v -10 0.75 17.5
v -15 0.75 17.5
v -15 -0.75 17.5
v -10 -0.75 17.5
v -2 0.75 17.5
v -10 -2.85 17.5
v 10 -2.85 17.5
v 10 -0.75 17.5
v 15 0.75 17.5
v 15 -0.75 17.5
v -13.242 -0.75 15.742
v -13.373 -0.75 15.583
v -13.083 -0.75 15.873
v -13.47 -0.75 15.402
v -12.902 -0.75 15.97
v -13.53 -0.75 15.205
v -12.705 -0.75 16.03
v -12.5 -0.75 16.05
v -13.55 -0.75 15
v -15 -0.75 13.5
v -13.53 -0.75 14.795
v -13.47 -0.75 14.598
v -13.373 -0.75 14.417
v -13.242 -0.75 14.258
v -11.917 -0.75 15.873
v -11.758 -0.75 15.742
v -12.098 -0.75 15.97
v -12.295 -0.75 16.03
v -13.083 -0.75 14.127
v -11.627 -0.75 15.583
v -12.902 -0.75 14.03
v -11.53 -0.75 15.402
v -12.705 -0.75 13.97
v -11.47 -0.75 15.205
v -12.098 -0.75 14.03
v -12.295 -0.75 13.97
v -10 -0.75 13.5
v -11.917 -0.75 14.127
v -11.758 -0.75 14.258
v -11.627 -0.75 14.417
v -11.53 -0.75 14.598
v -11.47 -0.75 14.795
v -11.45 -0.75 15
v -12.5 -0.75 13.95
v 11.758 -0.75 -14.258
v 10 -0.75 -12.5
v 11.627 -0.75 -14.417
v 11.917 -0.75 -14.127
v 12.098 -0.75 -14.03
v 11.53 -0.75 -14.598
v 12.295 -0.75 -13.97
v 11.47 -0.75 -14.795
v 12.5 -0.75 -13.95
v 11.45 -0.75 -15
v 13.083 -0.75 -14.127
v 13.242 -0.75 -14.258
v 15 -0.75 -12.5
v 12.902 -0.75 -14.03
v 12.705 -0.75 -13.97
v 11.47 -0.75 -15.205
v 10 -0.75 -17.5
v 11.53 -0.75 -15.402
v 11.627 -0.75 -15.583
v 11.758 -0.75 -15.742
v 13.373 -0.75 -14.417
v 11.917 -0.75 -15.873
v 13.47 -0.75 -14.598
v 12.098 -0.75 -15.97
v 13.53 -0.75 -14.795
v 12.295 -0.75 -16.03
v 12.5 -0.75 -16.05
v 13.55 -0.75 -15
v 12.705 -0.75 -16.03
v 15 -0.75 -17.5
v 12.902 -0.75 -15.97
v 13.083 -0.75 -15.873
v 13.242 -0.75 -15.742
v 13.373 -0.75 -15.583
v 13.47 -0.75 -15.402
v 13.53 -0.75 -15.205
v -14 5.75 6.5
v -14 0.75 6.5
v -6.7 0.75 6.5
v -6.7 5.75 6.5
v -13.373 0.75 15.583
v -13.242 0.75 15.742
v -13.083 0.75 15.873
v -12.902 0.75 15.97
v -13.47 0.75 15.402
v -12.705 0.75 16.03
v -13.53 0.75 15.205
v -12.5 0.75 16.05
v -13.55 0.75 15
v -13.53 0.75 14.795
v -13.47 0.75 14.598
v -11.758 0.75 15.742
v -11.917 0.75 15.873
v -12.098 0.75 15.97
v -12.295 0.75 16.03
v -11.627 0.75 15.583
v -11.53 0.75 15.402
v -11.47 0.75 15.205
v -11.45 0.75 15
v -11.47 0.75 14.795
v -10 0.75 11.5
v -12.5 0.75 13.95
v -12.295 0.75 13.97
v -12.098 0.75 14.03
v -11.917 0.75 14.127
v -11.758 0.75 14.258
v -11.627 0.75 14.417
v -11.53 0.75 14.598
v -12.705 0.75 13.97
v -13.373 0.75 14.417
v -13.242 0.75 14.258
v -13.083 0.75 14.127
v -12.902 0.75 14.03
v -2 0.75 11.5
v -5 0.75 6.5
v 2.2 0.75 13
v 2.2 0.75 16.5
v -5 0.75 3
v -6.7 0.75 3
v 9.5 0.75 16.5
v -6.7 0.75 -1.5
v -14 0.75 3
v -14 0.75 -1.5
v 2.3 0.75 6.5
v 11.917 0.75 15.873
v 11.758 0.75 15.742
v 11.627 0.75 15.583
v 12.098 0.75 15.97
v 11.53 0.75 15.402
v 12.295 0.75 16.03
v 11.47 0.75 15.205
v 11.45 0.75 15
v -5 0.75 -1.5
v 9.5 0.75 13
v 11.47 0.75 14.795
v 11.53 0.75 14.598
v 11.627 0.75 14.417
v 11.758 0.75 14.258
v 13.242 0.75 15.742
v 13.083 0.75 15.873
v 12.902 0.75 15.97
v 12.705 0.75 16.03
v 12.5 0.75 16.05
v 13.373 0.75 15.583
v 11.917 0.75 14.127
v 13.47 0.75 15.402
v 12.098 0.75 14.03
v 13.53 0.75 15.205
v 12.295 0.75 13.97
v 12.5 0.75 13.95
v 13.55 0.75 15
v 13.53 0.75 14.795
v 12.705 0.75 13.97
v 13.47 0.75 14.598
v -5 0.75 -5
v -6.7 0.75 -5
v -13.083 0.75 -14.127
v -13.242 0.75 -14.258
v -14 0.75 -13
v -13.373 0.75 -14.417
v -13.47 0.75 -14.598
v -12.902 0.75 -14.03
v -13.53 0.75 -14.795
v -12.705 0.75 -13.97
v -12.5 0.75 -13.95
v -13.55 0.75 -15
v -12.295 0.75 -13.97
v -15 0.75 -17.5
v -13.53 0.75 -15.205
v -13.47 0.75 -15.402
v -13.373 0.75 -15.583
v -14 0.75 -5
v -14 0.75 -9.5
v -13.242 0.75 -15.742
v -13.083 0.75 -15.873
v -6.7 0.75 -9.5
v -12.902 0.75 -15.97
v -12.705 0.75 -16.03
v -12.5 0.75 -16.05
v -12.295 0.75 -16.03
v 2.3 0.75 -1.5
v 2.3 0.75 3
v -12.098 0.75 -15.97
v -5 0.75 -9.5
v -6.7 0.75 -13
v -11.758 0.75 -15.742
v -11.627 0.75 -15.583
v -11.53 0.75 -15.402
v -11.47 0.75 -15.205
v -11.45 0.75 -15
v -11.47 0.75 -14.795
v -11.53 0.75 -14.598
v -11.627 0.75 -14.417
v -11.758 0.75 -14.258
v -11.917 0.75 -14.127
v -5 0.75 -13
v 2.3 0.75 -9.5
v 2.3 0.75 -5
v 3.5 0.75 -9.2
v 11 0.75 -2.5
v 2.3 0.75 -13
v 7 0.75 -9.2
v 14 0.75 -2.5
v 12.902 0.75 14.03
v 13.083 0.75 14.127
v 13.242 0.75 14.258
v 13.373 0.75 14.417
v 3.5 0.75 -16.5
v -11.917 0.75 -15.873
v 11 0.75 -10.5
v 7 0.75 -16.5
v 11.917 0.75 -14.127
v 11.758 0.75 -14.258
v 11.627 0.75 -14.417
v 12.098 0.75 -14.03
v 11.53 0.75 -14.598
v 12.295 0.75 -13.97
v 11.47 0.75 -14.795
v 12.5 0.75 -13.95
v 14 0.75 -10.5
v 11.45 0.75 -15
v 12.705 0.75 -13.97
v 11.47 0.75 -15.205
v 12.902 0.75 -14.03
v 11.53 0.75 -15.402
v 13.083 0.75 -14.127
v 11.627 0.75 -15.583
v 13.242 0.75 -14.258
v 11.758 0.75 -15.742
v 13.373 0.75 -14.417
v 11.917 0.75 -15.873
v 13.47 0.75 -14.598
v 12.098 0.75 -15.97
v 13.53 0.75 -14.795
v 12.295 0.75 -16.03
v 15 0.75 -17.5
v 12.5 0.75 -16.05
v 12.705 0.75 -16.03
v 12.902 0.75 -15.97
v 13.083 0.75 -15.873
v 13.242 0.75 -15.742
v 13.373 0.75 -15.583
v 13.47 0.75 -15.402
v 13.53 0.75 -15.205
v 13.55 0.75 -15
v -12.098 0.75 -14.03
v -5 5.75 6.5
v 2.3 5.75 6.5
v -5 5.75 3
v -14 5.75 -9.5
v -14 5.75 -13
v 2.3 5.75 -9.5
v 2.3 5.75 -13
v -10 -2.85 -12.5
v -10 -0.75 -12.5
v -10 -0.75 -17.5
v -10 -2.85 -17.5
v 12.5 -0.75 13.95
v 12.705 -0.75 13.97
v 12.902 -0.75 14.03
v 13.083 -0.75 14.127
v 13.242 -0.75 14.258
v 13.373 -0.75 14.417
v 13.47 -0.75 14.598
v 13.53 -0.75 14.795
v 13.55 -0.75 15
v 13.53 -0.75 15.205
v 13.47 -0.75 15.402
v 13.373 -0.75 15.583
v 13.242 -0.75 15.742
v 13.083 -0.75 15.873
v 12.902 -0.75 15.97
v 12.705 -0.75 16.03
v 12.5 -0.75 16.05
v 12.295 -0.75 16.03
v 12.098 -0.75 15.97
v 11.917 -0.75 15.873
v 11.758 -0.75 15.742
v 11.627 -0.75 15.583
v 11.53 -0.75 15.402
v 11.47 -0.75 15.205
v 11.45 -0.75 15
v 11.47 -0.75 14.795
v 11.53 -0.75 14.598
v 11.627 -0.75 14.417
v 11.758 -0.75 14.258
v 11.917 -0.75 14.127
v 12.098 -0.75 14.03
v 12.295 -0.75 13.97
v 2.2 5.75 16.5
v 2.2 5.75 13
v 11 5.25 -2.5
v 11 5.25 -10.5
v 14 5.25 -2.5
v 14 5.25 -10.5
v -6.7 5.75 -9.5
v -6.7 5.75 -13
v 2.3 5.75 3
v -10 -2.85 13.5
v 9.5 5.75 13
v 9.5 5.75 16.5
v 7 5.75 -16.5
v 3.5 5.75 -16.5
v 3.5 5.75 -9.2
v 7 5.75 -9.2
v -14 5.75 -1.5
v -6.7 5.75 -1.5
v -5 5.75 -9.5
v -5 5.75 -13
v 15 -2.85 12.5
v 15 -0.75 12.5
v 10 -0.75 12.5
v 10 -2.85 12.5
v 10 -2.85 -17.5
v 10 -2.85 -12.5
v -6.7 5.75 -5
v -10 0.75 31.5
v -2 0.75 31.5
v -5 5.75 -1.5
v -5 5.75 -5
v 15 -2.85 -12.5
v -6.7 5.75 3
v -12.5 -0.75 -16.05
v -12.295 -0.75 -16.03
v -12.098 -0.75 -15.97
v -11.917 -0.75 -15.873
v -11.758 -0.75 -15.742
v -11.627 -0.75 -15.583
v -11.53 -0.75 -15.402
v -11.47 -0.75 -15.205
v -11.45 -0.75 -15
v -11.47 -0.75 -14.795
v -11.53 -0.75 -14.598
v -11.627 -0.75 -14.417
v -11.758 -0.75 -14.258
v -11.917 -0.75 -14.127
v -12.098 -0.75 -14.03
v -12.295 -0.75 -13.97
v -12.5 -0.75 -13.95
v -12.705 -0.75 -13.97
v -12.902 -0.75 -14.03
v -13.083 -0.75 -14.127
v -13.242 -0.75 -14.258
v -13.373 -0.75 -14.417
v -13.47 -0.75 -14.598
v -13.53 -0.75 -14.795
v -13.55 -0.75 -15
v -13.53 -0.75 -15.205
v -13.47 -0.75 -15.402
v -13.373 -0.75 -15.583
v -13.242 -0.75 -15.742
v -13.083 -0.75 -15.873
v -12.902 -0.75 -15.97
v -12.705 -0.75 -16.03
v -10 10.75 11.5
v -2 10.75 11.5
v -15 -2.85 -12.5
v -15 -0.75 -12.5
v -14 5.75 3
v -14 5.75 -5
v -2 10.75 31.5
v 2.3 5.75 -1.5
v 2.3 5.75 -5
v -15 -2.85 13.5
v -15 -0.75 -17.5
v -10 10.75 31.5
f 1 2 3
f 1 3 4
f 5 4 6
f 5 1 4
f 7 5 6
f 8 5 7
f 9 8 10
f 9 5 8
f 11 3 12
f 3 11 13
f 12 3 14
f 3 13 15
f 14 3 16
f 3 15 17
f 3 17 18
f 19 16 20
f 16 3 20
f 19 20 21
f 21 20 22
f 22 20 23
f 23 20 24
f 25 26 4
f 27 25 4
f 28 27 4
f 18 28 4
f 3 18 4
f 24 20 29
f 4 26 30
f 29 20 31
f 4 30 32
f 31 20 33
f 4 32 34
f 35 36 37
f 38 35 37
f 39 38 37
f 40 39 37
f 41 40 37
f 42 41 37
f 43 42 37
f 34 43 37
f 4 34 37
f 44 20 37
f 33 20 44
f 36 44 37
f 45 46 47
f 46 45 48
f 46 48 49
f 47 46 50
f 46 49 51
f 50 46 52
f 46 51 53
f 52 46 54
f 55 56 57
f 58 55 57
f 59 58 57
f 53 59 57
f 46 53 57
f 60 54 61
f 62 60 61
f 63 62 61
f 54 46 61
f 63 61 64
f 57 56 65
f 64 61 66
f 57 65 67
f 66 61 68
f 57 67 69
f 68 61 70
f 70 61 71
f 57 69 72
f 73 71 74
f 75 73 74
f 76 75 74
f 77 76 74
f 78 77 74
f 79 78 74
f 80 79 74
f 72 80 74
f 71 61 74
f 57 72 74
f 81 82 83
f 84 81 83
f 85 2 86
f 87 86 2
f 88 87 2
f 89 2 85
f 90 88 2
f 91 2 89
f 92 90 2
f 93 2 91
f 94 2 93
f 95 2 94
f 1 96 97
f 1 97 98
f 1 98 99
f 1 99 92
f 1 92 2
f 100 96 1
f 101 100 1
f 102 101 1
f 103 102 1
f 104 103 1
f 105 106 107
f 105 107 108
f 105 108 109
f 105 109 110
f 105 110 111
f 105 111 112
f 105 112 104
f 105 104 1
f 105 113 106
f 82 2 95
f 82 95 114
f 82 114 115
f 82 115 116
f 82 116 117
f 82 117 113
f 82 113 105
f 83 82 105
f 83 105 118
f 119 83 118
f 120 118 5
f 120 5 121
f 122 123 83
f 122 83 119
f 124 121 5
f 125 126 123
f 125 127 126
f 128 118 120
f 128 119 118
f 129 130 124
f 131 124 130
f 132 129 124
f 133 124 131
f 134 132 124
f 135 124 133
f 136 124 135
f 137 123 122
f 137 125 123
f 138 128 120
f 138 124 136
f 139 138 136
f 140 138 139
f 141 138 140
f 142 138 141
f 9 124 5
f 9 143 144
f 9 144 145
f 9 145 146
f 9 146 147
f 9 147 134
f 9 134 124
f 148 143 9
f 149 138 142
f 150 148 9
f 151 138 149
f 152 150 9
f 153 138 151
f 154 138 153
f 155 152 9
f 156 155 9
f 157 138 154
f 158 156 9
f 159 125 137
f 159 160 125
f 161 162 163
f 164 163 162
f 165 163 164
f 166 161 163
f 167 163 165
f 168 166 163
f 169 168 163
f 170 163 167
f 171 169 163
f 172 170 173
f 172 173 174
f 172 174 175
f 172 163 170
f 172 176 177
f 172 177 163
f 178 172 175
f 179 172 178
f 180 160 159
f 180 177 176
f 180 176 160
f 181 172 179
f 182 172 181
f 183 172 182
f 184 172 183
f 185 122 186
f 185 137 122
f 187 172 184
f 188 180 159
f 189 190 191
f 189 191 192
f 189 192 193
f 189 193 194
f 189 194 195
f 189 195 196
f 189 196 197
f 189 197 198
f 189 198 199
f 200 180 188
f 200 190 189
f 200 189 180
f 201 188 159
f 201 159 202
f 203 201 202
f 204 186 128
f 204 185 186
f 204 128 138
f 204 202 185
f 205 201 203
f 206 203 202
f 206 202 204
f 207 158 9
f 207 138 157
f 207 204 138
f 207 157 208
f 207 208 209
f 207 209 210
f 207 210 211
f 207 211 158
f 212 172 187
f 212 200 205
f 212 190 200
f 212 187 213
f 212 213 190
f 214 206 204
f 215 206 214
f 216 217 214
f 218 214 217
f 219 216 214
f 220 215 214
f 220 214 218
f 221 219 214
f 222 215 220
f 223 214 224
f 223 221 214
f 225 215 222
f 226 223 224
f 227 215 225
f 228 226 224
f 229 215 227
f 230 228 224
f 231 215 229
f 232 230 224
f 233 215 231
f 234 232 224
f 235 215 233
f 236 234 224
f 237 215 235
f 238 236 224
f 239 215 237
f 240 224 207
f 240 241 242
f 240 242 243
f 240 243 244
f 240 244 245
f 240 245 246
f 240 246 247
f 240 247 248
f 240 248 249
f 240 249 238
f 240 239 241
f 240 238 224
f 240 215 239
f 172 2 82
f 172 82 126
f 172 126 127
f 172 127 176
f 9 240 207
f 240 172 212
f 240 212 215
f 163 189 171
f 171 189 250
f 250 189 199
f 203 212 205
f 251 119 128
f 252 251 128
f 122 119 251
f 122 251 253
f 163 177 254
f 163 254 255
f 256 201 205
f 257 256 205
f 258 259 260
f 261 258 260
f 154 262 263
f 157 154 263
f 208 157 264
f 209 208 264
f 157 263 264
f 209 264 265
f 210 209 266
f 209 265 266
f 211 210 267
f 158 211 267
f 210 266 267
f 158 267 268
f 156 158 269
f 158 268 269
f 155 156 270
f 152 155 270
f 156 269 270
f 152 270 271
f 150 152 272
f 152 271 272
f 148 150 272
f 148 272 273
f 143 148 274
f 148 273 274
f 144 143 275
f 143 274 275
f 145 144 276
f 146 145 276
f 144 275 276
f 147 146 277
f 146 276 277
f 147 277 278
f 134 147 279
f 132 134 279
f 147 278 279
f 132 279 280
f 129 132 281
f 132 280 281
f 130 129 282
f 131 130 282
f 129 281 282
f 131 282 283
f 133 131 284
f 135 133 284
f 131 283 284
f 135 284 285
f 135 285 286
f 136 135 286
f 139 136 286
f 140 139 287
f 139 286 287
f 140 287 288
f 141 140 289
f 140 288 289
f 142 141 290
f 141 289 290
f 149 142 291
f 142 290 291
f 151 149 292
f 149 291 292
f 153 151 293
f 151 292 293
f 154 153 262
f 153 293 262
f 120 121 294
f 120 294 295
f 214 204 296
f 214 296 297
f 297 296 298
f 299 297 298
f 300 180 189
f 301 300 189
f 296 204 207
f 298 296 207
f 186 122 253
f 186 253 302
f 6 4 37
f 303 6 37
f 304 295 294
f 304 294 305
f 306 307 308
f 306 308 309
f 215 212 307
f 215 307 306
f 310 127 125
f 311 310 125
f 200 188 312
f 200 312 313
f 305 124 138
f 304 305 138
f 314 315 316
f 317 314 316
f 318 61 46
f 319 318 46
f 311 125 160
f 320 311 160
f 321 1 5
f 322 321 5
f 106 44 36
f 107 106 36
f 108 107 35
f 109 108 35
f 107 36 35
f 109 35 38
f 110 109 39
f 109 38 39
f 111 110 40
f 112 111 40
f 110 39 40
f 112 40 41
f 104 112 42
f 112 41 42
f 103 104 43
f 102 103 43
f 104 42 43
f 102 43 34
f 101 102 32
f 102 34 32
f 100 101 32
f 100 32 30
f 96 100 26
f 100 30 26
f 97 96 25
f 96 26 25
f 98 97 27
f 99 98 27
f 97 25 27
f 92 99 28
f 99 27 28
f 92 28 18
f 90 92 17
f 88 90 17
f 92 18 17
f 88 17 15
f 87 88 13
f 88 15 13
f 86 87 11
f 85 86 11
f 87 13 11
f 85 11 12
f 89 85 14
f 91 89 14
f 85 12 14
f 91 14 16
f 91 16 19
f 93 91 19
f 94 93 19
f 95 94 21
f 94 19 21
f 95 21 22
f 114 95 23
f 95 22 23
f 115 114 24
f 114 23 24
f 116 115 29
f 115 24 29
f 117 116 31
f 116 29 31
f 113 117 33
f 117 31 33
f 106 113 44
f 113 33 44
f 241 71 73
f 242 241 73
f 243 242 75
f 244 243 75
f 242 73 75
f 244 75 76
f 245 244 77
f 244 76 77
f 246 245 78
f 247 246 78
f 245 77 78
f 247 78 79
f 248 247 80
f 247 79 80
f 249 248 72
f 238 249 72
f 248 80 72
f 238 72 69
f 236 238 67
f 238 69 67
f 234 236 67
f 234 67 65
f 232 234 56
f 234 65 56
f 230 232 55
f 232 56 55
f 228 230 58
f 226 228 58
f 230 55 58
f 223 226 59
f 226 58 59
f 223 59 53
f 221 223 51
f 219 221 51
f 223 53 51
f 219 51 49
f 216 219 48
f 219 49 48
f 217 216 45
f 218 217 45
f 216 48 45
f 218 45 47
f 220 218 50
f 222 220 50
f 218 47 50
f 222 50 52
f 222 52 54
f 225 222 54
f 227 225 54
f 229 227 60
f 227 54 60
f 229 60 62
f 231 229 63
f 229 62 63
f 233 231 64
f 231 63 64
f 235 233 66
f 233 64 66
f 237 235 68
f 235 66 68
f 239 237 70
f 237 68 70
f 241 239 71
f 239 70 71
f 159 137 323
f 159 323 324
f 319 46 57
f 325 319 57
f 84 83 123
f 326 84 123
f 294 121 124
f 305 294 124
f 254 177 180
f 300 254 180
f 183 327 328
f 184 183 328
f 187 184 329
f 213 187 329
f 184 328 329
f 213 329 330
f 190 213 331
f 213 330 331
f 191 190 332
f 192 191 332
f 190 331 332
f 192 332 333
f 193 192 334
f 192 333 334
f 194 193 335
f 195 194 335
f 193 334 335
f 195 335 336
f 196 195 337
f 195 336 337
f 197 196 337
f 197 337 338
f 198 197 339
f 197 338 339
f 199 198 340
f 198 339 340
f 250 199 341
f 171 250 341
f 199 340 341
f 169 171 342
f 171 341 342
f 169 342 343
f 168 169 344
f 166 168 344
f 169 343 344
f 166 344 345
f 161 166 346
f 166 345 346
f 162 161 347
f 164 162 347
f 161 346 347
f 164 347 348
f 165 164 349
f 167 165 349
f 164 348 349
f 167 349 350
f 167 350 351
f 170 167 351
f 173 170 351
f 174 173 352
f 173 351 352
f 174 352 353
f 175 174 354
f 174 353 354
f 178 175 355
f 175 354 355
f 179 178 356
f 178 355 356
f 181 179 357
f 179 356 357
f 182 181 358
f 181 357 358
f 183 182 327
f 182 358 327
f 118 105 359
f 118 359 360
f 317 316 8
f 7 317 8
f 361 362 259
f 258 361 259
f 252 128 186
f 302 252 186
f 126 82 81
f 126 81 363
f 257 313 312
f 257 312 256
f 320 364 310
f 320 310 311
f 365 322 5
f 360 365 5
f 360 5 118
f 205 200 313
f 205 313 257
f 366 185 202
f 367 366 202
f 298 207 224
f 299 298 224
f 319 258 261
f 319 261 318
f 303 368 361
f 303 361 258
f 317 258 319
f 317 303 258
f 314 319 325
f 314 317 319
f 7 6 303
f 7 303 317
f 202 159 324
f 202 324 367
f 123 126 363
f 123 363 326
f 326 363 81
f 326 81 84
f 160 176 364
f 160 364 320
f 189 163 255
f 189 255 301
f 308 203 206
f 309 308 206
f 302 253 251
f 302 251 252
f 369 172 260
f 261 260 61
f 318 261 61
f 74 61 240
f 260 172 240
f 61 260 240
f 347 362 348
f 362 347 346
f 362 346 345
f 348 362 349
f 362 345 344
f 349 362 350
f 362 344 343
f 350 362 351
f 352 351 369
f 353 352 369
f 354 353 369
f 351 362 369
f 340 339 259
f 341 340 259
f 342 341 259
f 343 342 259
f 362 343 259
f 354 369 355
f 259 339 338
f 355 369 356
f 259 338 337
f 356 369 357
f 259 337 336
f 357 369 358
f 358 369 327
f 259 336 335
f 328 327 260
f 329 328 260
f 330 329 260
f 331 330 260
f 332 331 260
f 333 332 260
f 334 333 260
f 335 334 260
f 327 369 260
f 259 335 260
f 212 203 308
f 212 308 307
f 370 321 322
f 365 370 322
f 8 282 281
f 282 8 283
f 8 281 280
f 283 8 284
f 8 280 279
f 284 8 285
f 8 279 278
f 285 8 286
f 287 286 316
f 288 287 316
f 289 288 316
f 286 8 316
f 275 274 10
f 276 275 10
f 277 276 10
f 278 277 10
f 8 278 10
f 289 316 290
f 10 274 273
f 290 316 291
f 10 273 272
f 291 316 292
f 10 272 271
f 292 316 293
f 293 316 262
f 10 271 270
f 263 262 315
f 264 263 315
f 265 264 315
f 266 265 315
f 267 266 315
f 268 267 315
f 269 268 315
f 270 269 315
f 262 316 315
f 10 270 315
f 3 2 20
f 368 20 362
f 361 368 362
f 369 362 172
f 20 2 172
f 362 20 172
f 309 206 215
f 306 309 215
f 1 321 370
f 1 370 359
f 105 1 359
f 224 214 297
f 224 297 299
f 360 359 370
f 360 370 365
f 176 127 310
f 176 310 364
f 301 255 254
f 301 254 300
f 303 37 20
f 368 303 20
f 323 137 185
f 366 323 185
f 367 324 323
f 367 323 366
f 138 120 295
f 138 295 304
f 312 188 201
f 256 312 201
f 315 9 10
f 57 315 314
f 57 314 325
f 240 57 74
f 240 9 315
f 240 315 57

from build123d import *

# Parameters (mm, degrees)
SKETCH_1_W                       = 30
SKETCH_1_H                       = 35
EXTRUDE_1_DEPTH                  = 0.75
SKETCH_2_R                       = 1.05
CUT_EXTRUDE_1_DEPTH              = 1.5
EXTRUDE_2_DEPTH                  = 2.1
SKETCH_4_W                       = 3.5
SKETCH_4_H                       = 7.3
SKETCH_4_W_2                     = 7.3
SKETCH_4_H_2                     = 3.5
EXTRUDE_3_DEPTH                  = 5
SKETCH_5_W                       = 7.3
SKETCH_5_H                       = 3.5
EXTRUDE_4_DEPTH                  = 5
PATTERN_LINEAR_1_COUNT           = 2
PATTERN_LINEAR_1_PITCH           = 9
PATTERN_LINEAR_2_COUNT           = 3
PATTERN_LINEAR_2_PITCH           = 8
PATTERN_LINEAR_2_COPY_1_SKETCH_W = 7.3
PATTERN_LINEAR_2_COPY_1_SKETCH_H = 3.5
PATTERN_LINEAR_2_COPY_1_DEPTH    = 5
PATTERN_LINEAR_2_COPY_2_SKETCH_W = 7.3
PATTERN_LINEAR_2_COPY_2_SKETCH_H = 3.5
PATTERN_LINEAR_2_COPY_2_DEPTH    = 5
SKETCH_6_W                       = 3
SKETCH_6_H                       = 8
EXTRUDE_5_DEPTH                  = 4.5
SKETCH_7_W                       = 8
SKETCH_7_H                       = 20
EXTRUDE_6_DEPTH                  = 10


with BuildPart() as part:
    # ｽｹｯﾁ1 → ﾎﾞｽ - 押し出し1 (new, symmetric)
    with BuildSketch(Plane(origin=(0, 0, 0), x_dir=(1, 0, 0), z_dir=(0, 1, 0))):
        Rectangle(SKETCH_1_W, SKETCH_1_H)
    extrude(amount=EXTRUDE_1_DEPTH, both=True)

    # ｽｹｯﾁ2 → ｶｯﾄ - 押し出し1 (cut)
    with BuildSketch(Plane.XZ.offset(0.75)):
        with Locations(Location((-12.5, 15, 0), (0, 0, 270))):
            Circle(SKETCH_2_R)
        with Locations(Location((-12.5, -15, 0), (0, 0, 270))):
            Circle(SKETCH_2_R)
        with Locations(Location((12.5, 15, 0), (0, 0, 270))):
            Circle(SKETCH_2_R)
        with Locations(Location((12.5, -15, 0), (0, 0, 270))):
            Circle(SKETCH_2_R)
    extrude(amount=-CUT_EXTRUDE_1_DEPTH, mode=Mode.SUBTRACT)

    # ｽｹｯﾁ3 → ﾎﾞｽ - 押し出し2 (add)
    with BuildSketch(Plane.XZ.offset(0.75)):
        Polygon((-10, 17.5), (-10, 13.5), (-15, 13.5), (-15, -12.5), (-10, -12.5), (-10, -17.5), (10, -17.5), (10, -12.5), (15, -12.5), (15, 12.5), (10, 12.5), (10, 17.5), align=None)
    extrude(amount=EXTRUDE_2_DEPTH)

    # ｽｹｯﾁ4 → ﾎﾞｽ - 押し出し3 (add)
    with BuildSketch(Plane(origin=(0, 0.75, 0), x_dir=(1, 0, 0), z_dir=(0, 1, 0))):
        with Locations((5.25, 12.85)):
            Rectangle(SKETCH_4_W, SKETCH_4_H)
        with Locations((5.85, -14.75)):
            Rectangle(SKETCH_4_W_2, SKETCH_4_H_2)
    extrude(amount=EXTRUDE_3_DEPTH)

    # ｽｹｯﾁ5 → ﾎﾞｽ - 押し出し4 (add)
    with BuildSketch(Plane(origin=(0, 0.75, 0), x_dir=(1, 0, 0), z_dir=(0, 1, 0))):
        with Locations((-10.35, 11.25)):
            Rectangle(SKETCH_5_W, SKETCH_5_H)
    extrude_4 = extrude(amount=EXTRUDE_4_DEPTH)

    # 直線ﾊﾟﾀｰﾝ1: ﾎﾞｽ - 押し出し4 ×2
    with Locations(*[(i * PATTERN_LINEAR_1_PITCH, 0, 0) for i in range(1, PATTERN_LINEAR_1_COUNT)]):
        add(extrude_4)

    # 直線ﾊﾟﾀｰﾝ2: ﾎﾞｽ - 押し出し4 ×3
    with Locations(*[(0, 0, i * PATTERN_LINEAR_2_PITCH) for i in range(1, PATTERN_LINEAR_2_COUNT)]):
        add(extrude_4)

    # 直線ﾊﾟﾀｰﾝ2 copy 1 sketch → 直線ﾊﾟﾀｰﾝ2 copy 1 (add)
    with BuildSketch(Plane(origin=(9, 0.75, 8), x_dir=(1, 0, 0), z_dir=(0, 1, 0))):
        with Locations((-10.35, 11.25)):
            Rectangle(PATTERN_LINEAR_2_COPY_1_SKETCH_W, PATTERN_LINEAR_2_COPY_1_SKETCH_H)
    extrude(amount=PATTERN_LINEAR_2_COPY_1_DEPTH)

    # 直線ﾊﾟﾀｰﾝ2 copy 2 sketch → 直線ﾊﾟﾀｰﾝ2 copy 2 (add)
    with BuildSketch(Plane(origin=(9, 0.75, 16), x_dir=(1, 0, 0), z_dir=(0, 1, 0))):
        with Locations((-10.35, 11.25)):
            Rectangle(PATTERN_LINEAR_2_COPY_2_SKETCH_W, PATTERN_LINEAR_2_COPY_2_SKETCH_H)
    extrude(amount=PATTERN_LINEAR_2_COPY_2_DEPTH)

    # ｽｹｯﾁ6 → ﾎﾞｽ - 押し出し5 (add)
    with BuildSketch(Plane(origin=(0, 0.75, 0), x_dir=(1, 0, 0), z_dir=(0, 1, 0))):
        with Locations((12.5, 6.5)):
            Rectangle(SKETCH_6_W, SKETCH_6_H)
    extrude(amount=EXTRUDE_5_DEPTH)

    # ｽｹｯﾁ7 → ﾎﾞｽ - 押し出し6 (add)
    with BuildSketch(Plane(origin=(0, 0.75, 0), x_dir=(1, 0, 0), z_dir=(0, 1, 0))):
        with Locations((-6, -21.5)):
            Rectangle(SKETCH_7_W, SKETCH_7_H)
    extrude(amount=EXTRUDE_6_DEPTH)


solid = part.part
